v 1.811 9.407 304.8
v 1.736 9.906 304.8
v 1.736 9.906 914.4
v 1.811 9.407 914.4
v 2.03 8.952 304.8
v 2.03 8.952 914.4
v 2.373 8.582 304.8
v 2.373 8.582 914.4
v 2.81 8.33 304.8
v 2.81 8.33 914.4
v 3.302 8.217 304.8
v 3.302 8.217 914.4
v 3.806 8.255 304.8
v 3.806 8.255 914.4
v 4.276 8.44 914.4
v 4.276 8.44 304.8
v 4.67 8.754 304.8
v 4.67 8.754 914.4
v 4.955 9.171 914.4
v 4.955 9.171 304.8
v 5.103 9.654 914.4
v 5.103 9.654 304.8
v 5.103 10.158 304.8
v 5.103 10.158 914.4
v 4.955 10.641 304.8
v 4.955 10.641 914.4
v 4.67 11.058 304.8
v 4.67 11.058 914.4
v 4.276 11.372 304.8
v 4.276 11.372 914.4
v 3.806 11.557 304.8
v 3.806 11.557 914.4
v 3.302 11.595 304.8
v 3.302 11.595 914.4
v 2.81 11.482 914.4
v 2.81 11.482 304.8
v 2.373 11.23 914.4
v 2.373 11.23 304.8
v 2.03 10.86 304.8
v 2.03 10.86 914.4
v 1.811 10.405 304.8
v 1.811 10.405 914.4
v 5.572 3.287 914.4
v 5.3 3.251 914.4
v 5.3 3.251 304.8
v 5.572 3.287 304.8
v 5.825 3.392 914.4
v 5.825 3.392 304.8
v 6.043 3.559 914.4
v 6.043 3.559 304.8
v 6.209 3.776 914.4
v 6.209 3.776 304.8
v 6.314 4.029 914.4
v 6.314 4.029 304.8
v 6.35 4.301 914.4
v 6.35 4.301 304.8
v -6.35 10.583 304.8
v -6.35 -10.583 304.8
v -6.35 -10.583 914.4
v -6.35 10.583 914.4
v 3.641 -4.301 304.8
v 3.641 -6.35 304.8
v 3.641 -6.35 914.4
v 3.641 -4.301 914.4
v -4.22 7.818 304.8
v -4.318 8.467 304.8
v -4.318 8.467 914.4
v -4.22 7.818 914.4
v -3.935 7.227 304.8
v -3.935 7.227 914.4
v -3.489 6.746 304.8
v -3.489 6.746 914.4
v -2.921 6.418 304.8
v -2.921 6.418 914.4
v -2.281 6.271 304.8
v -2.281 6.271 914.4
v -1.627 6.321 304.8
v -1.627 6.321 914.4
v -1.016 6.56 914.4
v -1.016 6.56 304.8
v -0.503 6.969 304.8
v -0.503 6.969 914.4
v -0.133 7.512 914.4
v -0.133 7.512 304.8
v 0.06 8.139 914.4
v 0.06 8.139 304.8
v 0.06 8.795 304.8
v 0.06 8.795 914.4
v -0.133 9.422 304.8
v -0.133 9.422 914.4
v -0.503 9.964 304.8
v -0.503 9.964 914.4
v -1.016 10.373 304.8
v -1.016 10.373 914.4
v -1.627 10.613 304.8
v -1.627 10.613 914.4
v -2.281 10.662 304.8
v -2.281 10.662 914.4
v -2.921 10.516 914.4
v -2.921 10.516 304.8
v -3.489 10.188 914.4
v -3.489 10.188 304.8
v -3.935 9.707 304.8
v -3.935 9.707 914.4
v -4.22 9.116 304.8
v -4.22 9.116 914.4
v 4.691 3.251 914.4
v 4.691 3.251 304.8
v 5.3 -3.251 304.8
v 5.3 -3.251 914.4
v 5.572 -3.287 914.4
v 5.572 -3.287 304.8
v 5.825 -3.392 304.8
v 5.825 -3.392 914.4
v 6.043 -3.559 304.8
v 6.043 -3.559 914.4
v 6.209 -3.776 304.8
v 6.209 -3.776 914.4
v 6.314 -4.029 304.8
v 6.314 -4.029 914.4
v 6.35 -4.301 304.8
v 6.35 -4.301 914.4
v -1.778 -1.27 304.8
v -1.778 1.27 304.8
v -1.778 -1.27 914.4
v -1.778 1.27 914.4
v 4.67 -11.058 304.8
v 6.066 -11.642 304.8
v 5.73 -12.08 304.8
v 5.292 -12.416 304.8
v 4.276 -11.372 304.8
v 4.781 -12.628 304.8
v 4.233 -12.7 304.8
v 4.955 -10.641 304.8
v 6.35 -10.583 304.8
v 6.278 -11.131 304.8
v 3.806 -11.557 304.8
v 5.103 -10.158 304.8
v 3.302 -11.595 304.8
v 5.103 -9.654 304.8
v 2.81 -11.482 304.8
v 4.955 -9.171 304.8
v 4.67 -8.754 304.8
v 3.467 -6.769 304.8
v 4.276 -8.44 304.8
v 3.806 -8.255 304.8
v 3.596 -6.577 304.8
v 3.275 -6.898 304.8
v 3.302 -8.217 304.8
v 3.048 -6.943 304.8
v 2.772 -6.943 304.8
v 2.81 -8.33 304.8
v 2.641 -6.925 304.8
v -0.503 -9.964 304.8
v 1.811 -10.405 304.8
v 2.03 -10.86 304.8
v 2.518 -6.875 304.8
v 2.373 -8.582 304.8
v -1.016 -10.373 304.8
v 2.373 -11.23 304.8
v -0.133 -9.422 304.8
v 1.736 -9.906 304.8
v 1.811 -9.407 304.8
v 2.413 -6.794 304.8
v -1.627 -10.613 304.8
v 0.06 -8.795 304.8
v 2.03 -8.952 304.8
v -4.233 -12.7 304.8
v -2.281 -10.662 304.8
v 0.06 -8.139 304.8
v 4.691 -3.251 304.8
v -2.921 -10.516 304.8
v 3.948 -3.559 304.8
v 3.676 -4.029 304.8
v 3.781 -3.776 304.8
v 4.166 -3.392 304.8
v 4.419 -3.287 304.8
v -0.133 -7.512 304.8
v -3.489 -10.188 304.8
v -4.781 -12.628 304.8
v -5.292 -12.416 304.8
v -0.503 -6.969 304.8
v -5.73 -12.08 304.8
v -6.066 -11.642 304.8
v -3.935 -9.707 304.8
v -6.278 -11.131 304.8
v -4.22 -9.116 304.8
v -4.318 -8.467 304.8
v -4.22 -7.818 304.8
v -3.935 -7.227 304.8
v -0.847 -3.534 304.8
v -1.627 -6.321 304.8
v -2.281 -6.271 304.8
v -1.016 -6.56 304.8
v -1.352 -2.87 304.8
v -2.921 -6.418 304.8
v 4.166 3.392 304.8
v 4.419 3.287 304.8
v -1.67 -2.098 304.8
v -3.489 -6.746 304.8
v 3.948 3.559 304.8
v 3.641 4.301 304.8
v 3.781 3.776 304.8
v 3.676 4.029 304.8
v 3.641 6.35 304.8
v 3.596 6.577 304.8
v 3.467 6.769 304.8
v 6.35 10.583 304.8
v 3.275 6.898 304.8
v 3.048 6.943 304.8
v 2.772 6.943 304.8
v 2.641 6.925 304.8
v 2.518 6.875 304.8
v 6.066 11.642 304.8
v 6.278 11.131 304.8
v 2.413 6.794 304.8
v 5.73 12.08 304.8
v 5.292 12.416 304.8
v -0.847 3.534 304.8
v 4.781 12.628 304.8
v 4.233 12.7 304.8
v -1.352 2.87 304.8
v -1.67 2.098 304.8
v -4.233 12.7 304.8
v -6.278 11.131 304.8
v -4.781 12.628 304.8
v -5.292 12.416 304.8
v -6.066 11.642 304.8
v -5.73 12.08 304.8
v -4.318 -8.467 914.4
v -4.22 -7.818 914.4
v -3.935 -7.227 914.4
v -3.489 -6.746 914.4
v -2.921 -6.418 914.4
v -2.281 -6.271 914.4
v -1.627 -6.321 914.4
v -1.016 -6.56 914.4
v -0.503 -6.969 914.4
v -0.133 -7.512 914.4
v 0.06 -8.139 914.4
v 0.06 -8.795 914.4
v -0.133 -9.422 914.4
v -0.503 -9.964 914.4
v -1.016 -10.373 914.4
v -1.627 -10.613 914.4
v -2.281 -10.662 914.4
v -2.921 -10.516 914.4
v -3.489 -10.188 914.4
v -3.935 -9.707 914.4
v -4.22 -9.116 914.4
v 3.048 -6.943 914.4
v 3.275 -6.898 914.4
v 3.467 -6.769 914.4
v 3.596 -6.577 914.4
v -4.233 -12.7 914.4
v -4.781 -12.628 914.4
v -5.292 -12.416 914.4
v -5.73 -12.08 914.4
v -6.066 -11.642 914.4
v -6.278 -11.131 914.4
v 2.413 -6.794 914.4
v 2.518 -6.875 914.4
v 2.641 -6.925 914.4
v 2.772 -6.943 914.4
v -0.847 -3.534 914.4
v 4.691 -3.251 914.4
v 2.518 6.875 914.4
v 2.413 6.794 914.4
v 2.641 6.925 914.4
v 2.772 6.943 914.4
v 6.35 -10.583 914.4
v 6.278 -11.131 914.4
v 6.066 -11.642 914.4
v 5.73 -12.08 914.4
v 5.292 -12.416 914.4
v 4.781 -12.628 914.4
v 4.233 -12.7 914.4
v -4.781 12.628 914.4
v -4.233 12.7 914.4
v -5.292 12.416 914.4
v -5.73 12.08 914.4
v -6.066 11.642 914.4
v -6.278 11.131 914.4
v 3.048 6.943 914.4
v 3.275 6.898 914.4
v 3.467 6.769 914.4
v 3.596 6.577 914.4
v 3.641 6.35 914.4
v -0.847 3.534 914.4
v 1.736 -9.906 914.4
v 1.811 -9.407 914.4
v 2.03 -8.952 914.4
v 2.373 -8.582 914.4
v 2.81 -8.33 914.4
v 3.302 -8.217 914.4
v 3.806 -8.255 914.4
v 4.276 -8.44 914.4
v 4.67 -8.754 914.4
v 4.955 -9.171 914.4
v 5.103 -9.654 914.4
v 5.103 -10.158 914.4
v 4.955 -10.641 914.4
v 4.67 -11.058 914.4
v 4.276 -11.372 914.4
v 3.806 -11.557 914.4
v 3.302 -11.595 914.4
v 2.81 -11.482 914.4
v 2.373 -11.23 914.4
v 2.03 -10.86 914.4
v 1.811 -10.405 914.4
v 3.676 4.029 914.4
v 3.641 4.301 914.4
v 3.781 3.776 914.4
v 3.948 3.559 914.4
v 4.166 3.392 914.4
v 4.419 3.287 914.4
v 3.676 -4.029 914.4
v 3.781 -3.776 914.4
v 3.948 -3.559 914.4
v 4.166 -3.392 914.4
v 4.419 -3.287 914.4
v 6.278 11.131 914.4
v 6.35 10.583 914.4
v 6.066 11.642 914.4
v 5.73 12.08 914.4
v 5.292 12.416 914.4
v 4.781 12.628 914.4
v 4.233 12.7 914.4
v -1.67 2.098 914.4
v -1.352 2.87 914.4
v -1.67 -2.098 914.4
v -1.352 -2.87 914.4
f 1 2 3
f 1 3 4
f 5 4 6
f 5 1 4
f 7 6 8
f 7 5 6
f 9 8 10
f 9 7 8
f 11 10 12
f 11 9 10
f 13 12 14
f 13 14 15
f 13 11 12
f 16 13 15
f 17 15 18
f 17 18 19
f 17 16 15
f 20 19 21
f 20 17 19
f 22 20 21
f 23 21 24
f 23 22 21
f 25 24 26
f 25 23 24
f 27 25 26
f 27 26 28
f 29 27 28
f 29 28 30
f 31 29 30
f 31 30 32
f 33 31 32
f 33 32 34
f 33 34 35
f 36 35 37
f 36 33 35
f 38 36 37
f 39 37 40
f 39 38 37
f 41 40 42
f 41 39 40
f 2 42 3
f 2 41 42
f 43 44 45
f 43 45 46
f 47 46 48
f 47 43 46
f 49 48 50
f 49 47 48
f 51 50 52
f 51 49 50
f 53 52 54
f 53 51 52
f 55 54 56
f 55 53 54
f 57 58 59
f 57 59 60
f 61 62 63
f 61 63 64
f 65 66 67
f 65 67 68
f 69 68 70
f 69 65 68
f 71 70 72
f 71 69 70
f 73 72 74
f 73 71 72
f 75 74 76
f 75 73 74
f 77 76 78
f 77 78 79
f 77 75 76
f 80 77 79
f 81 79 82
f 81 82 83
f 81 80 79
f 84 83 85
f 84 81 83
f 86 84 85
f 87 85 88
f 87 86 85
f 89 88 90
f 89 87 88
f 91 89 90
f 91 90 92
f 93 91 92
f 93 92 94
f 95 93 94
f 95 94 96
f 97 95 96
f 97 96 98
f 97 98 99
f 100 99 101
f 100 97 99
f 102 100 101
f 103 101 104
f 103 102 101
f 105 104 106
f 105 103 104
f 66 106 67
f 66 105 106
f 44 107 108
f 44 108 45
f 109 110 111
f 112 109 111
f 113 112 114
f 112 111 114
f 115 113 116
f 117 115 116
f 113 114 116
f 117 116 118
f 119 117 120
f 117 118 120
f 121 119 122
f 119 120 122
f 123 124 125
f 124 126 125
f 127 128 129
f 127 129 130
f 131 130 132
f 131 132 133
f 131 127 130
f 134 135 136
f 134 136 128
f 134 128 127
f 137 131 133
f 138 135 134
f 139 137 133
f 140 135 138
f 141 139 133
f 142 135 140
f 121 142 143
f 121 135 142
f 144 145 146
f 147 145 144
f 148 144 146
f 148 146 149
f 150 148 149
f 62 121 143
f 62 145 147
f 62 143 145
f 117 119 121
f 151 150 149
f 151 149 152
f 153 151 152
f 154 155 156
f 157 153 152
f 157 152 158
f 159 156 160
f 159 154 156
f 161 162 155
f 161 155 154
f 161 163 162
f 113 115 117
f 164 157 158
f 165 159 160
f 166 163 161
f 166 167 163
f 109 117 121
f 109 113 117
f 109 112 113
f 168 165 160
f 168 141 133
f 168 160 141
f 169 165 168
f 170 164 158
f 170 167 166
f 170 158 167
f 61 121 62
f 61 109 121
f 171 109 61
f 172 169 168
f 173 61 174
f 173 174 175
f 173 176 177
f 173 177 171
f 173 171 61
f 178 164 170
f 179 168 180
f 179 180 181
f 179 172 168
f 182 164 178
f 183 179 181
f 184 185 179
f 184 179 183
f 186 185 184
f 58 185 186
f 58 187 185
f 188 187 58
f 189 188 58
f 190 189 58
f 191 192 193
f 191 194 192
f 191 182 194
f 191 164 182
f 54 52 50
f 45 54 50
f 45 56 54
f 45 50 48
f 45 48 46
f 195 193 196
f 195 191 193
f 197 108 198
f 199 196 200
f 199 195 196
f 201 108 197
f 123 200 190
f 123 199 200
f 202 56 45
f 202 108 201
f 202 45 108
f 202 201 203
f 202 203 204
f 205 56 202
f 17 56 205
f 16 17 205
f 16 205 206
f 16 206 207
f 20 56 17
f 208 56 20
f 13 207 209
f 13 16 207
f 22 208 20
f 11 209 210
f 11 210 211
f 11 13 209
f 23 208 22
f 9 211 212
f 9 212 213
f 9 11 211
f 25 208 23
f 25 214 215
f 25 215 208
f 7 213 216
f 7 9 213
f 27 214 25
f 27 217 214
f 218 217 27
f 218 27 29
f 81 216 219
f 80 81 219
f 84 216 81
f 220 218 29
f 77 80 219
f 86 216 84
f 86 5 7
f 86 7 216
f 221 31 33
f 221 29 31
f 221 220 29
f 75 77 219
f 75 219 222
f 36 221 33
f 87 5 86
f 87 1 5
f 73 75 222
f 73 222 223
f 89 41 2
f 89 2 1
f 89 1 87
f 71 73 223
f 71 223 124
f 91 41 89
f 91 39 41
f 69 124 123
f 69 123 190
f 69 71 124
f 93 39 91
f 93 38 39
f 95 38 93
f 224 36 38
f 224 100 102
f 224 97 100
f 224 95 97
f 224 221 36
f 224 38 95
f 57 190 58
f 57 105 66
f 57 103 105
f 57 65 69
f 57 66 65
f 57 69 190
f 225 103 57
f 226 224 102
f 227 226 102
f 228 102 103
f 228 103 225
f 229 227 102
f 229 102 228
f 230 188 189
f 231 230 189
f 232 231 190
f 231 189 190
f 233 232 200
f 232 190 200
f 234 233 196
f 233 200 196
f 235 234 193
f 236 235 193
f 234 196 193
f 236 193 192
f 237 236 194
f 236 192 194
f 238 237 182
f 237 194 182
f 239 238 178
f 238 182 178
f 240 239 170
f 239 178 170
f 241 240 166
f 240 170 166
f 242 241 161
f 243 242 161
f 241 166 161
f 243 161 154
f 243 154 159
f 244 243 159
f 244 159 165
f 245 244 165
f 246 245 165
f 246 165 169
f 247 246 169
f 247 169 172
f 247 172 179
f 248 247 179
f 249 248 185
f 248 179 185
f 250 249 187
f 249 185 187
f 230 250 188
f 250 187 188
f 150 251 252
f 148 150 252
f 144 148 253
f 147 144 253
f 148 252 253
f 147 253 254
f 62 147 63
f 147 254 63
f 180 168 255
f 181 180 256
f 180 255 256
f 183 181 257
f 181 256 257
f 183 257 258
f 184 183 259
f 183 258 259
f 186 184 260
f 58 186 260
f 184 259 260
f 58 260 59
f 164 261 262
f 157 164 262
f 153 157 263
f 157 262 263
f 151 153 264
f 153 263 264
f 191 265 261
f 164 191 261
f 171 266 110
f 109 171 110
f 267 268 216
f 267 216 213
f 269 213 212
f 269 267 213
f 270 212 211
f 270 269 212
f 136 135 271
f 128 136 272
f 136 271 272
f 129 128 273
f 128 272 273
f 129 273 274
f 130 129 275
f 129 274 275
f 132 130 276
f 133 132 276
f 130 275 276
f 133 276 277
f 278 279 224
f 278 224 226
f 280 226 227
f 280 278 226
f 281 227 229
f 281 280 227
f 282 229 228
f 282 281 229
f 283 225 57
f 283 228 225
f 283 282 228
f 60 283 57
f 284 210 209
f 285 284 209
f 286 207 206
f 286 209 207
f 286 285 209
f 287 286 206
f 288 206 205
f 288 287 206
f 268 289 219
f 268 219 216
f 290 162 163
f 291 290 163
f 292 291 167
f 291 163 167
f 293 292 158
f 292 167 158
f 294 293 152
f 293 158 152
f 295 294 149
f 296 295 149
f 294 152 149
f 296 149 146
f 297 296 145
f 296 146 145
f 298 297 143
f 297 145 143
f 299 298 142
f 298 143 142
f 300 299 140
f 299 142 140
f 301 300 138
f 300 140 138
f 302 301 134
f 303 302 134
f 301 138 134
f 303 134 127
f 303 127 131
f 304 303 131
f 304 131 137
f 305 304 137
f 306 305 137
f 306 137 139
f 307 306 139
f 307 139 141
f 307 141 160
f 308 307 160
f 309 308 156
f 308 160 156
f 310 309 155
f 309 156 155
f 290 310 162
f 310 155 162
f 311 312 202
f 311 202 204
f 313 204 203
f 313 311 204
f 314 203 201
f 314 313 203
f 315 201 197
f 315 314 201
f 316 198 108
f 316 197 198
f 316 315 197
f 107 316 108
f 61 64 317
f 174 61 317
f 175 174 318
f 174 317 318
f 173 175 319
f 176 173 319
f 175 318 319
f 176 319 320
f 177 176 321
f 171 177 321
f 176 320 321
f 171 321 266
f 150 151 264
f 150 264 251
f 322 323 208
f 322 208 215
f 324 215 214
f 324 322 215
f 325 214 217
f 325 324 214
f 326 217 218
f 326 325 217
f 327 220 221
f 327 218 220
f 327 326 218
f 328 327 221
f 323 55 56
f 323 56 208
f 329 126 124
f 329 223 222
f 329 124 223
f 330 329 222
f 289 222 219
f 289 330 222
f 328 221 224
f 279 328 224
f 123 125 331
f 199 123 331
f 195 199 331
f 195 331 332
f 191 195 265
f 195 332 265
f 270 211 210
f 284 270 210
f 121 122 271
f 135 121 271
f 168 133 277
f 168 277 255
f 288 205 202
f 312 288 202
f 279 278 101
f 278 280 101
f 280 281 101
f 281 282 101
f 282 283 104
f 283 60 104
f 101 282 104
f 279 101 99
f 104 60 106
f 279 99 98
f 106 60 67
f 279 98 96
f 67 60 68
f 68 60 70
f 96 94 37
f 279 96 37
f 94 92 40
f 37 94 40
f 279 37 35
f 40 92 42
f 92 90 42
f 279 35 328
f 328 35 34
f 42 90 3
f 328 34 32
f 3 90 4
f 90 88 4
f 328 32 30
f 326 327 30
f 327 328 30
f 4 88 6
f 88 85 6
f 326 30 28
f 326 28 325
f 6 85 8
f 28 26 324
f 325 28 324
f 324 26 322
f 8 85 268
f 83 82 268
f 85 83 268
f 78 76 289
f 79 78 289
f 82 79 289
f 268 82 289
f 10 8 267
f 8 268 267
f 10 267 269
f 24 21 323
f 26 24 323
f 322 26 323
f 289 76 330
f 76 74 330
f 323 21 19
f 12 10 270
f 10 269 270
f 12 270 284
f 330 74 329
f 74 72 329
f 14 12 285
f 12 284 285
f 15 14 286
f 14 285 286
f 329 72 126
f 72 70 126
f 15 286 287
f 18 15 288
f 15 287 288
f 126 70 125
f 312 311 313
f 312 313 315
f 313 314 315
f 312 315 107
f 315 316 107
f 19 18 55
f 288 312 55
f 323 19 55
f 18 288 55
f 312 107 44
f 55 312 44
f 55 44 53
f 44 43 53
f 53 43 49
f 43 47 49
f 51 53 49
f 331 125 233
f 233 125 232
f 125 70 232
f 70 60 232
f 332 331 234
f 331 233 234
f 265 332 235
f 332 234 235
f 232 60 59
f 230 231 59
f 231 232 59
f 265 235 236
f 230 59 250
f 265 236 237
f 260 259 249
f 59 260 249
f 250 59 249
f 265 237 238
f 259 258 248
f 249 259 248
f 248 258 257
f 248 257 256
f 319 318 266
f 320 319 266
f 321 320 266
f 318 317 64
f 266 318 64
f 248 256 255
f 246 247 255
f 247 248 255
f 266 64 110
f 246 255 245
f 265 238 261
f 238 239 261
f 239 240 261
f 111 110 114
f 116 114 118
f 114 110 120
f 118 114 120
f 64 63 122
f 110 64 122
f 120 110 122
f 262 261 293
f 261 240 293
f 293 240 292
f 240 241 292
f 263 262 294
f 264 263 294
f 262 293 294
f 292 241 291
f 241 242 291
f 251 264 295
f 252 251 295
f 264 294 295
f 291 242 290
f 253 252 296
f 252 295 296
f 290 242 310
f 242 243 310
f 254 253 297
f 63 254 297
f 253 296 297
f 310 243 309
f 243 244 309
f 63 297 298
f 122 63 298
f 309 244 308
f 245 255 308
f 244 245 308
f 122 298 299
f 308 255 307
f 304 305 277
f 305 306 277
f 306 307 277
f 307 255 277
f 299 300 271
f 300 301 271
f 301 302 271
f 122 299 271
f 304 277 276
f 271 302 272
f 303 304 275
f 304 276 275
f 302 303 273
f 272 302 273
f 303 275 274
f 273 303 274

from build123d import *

# Parameters (mm, degrees)
SKETCH3_R           = 2.201333333
SKETCH3_R_2         = 1.693333333
BOSS_EXTRUDE1_DEPTH = 914.4
CUT_EXTRUDE1_START  = -1219.2
CUT_EXTRUDE1_DEPTH  = 1219.2


with BuildPart() as part:
    # Sketch3 → Boss-Extrude1 (new, symmetric)
    with BuildSketch(Plane.XY):
        with BuildLine():
            Line((-1.778, 0), (-1.778, 1.27))
            ThreePointArc((-1.778, 1.27), (-1.536070654, 2.494011801), (-0.846666667, 3.533942971))
            Line((-0.846666667, 3.533942971), (2.413267273, 6.793876912))
            ThreePointArc((2.413267273, 6.793876912), (2.578074335, 6.903997469), (2.772477518, 6.942666667))
            Line((2.772477518, 6.942666667), (3.048, 6.942666667))
            ThreePointArc((3.048, 6.942666667), (3.467078619, 6.769078619), (3.640666667, 6.35))
            Line((3.640666667, 6.35), (3.640666667, 4.301066667))
            ThreePointArc((3.640666667, 4.301066667), (3.948165494, 3.558698827), (4.690533333, 3.2512))
            Line((4.690533333, 3.2512), (5.300133333, 3.2512))
            ThreePointArc((5.300133333, 3.2512), (6.042501173, 3.558698827), (6.35, 4.301066667))
            Line((6.35, 4.301066667), (6.35, 10.583333333))
            ThreePointArc((6.35, 10.583333333), (5.730042687, 12.080042687), (4.233333333, 12.7))
            Line((4.233333333, 12.7), (-4.233333333, 12.7))
            ThreePointArc((-4.233333333, 12.7), (-5.730042687, 12.080042687), (-6.35, 10.583333333))
            Line((-6.35, 10.583333333), (-6.35, 0))
            Line((-6.35, 0), (-1.778, 0))
        make_face()
        with Locations(Location((-2.116666667, 8.466666667, 0), (0, 0, 180))):
            Circle(SKETCH3_R, mode=Mode.SUBTRACT)
        with Locations(Location((3.429, 9.906, 0), (0, 0, 180))):
            Circle(SKETCH3_R_2, mode=Mode.SUBTRACT)
    extrude(amount=BOSS_EXTRUDE1_DEPTH, both=True)

    # Mirror1: part across plane


with BuildPart() as part_1:
    add(part.part)
    add(part.part.mirror(Plane.ZX))

    # Sketch4 → Cut-Extrude1 (cut)
    with BuildSketch(Plane(origin=(0, 0, -914.4), x_dir=(-1, 0, 0), z_dir=(0, 0, -1)).offset(CUT_EXTRUDE1_START)):
        with BuildLine():
            Line((1.778, 1.27), (1.778, -1.27))
            ThreePointArc((1.778, -1.27), (1.536070654, -2.494011801), (0.846666667, -3.533942971))
            Line((0.846666667, -3.533942971), (-2.413267273, -6.793876912))
            ThreePointArc((-2.413267273, -6.793876912), (-2.578074335, -6.903997469), (-2.772477518, -6.942666667))
            Line((-2.772477518, -6.942666667), (-3.048, -6.942666667))
            ThreePointArc((-3.048, -6.942666667), (-3.467078619, -6.769078619), (-3.640666667, -6.35))
            Line((-3.640666667, -6.35), (-3.640666667, -4.301066667))
            ThreePointArc((-3.640666667, -4.301066667), (-3.948165494, -3.558698827), (-4.690533333, -3.2512))
            Line((-4.690533333, -3.2512), (-5.300133333, -3.2512))
            ThreePointArc((-5.300133333, -3.2512), (-6.042501173, -3.558698827), (-6.35, -4.301066667))
            Line((-6.35, -4.301066667), (-6.35, -10.583333333))
            ThreePointArc((-6.35, -10.583333333), (-5.730042687, -12.080042687), (-4.233333333, -12.7))
            Line((-4.233333333, -12.7), (4.233333333, -12.7))
            ThreePointArc((4.233333333, -12.7), (5.730042687, -12.080042687), (6.35, -10.583333333))
            Line((6.35, -10.583333333), (6.35, 10.583333333))
            ThreePointArc((6.35, 10.583333333), (5.730042687, 12.080042687), (4.233333333, 12.7))
            Line((4.233333333, 12.7), (-4.233333333, 12.7))
            ThreePointArc((-4.233333333, 12.7), (-5.730042687, 12.080042687), (-6.35, 10.583333333))
            Line((-6.35, 10.583333333), (-6.35, 4.301066667))
            ThreePointArc((-6.35, 4.301066667), (-6.042501173, 3.558698827), (-5.300133333, 3.2512))
            Line((-5.300133333, 3.2512), (-4.690533333, 3.2512))
            ThreePointArc((-4.690533333, 3.2512), (-3.948165494, 3.558698827), (-3.640666667, 4.301066667))
            Line((-3.640666667, 4.301066667), (-3.640666667, 6.35))
            ThreePointArc((-3.640666667, 6.35), (-3.467078619, 6.769078619), (-3.048, 6.942666667))
            Line((-3.048, 6.942666667), (-2.772477518, 6.942666667))
            ThreePointArc((-2.772477518, 6.942666667), (-2.578074335, 6.903997469), (-2.413267273, 6.793876912))
            Line((-2.413267273, 6.793876912), (0.846666667, 3.533942971))
            ThreePointArc((0.846666667, 3.533942971), (1.536070654, 2.494011801), (1.778, 1.27))
        make_face()
    extrude(amount=CUT_EXTRUDE1_DEPTH, mode=Mode.SUBTRACT)


solid = part_1.part
